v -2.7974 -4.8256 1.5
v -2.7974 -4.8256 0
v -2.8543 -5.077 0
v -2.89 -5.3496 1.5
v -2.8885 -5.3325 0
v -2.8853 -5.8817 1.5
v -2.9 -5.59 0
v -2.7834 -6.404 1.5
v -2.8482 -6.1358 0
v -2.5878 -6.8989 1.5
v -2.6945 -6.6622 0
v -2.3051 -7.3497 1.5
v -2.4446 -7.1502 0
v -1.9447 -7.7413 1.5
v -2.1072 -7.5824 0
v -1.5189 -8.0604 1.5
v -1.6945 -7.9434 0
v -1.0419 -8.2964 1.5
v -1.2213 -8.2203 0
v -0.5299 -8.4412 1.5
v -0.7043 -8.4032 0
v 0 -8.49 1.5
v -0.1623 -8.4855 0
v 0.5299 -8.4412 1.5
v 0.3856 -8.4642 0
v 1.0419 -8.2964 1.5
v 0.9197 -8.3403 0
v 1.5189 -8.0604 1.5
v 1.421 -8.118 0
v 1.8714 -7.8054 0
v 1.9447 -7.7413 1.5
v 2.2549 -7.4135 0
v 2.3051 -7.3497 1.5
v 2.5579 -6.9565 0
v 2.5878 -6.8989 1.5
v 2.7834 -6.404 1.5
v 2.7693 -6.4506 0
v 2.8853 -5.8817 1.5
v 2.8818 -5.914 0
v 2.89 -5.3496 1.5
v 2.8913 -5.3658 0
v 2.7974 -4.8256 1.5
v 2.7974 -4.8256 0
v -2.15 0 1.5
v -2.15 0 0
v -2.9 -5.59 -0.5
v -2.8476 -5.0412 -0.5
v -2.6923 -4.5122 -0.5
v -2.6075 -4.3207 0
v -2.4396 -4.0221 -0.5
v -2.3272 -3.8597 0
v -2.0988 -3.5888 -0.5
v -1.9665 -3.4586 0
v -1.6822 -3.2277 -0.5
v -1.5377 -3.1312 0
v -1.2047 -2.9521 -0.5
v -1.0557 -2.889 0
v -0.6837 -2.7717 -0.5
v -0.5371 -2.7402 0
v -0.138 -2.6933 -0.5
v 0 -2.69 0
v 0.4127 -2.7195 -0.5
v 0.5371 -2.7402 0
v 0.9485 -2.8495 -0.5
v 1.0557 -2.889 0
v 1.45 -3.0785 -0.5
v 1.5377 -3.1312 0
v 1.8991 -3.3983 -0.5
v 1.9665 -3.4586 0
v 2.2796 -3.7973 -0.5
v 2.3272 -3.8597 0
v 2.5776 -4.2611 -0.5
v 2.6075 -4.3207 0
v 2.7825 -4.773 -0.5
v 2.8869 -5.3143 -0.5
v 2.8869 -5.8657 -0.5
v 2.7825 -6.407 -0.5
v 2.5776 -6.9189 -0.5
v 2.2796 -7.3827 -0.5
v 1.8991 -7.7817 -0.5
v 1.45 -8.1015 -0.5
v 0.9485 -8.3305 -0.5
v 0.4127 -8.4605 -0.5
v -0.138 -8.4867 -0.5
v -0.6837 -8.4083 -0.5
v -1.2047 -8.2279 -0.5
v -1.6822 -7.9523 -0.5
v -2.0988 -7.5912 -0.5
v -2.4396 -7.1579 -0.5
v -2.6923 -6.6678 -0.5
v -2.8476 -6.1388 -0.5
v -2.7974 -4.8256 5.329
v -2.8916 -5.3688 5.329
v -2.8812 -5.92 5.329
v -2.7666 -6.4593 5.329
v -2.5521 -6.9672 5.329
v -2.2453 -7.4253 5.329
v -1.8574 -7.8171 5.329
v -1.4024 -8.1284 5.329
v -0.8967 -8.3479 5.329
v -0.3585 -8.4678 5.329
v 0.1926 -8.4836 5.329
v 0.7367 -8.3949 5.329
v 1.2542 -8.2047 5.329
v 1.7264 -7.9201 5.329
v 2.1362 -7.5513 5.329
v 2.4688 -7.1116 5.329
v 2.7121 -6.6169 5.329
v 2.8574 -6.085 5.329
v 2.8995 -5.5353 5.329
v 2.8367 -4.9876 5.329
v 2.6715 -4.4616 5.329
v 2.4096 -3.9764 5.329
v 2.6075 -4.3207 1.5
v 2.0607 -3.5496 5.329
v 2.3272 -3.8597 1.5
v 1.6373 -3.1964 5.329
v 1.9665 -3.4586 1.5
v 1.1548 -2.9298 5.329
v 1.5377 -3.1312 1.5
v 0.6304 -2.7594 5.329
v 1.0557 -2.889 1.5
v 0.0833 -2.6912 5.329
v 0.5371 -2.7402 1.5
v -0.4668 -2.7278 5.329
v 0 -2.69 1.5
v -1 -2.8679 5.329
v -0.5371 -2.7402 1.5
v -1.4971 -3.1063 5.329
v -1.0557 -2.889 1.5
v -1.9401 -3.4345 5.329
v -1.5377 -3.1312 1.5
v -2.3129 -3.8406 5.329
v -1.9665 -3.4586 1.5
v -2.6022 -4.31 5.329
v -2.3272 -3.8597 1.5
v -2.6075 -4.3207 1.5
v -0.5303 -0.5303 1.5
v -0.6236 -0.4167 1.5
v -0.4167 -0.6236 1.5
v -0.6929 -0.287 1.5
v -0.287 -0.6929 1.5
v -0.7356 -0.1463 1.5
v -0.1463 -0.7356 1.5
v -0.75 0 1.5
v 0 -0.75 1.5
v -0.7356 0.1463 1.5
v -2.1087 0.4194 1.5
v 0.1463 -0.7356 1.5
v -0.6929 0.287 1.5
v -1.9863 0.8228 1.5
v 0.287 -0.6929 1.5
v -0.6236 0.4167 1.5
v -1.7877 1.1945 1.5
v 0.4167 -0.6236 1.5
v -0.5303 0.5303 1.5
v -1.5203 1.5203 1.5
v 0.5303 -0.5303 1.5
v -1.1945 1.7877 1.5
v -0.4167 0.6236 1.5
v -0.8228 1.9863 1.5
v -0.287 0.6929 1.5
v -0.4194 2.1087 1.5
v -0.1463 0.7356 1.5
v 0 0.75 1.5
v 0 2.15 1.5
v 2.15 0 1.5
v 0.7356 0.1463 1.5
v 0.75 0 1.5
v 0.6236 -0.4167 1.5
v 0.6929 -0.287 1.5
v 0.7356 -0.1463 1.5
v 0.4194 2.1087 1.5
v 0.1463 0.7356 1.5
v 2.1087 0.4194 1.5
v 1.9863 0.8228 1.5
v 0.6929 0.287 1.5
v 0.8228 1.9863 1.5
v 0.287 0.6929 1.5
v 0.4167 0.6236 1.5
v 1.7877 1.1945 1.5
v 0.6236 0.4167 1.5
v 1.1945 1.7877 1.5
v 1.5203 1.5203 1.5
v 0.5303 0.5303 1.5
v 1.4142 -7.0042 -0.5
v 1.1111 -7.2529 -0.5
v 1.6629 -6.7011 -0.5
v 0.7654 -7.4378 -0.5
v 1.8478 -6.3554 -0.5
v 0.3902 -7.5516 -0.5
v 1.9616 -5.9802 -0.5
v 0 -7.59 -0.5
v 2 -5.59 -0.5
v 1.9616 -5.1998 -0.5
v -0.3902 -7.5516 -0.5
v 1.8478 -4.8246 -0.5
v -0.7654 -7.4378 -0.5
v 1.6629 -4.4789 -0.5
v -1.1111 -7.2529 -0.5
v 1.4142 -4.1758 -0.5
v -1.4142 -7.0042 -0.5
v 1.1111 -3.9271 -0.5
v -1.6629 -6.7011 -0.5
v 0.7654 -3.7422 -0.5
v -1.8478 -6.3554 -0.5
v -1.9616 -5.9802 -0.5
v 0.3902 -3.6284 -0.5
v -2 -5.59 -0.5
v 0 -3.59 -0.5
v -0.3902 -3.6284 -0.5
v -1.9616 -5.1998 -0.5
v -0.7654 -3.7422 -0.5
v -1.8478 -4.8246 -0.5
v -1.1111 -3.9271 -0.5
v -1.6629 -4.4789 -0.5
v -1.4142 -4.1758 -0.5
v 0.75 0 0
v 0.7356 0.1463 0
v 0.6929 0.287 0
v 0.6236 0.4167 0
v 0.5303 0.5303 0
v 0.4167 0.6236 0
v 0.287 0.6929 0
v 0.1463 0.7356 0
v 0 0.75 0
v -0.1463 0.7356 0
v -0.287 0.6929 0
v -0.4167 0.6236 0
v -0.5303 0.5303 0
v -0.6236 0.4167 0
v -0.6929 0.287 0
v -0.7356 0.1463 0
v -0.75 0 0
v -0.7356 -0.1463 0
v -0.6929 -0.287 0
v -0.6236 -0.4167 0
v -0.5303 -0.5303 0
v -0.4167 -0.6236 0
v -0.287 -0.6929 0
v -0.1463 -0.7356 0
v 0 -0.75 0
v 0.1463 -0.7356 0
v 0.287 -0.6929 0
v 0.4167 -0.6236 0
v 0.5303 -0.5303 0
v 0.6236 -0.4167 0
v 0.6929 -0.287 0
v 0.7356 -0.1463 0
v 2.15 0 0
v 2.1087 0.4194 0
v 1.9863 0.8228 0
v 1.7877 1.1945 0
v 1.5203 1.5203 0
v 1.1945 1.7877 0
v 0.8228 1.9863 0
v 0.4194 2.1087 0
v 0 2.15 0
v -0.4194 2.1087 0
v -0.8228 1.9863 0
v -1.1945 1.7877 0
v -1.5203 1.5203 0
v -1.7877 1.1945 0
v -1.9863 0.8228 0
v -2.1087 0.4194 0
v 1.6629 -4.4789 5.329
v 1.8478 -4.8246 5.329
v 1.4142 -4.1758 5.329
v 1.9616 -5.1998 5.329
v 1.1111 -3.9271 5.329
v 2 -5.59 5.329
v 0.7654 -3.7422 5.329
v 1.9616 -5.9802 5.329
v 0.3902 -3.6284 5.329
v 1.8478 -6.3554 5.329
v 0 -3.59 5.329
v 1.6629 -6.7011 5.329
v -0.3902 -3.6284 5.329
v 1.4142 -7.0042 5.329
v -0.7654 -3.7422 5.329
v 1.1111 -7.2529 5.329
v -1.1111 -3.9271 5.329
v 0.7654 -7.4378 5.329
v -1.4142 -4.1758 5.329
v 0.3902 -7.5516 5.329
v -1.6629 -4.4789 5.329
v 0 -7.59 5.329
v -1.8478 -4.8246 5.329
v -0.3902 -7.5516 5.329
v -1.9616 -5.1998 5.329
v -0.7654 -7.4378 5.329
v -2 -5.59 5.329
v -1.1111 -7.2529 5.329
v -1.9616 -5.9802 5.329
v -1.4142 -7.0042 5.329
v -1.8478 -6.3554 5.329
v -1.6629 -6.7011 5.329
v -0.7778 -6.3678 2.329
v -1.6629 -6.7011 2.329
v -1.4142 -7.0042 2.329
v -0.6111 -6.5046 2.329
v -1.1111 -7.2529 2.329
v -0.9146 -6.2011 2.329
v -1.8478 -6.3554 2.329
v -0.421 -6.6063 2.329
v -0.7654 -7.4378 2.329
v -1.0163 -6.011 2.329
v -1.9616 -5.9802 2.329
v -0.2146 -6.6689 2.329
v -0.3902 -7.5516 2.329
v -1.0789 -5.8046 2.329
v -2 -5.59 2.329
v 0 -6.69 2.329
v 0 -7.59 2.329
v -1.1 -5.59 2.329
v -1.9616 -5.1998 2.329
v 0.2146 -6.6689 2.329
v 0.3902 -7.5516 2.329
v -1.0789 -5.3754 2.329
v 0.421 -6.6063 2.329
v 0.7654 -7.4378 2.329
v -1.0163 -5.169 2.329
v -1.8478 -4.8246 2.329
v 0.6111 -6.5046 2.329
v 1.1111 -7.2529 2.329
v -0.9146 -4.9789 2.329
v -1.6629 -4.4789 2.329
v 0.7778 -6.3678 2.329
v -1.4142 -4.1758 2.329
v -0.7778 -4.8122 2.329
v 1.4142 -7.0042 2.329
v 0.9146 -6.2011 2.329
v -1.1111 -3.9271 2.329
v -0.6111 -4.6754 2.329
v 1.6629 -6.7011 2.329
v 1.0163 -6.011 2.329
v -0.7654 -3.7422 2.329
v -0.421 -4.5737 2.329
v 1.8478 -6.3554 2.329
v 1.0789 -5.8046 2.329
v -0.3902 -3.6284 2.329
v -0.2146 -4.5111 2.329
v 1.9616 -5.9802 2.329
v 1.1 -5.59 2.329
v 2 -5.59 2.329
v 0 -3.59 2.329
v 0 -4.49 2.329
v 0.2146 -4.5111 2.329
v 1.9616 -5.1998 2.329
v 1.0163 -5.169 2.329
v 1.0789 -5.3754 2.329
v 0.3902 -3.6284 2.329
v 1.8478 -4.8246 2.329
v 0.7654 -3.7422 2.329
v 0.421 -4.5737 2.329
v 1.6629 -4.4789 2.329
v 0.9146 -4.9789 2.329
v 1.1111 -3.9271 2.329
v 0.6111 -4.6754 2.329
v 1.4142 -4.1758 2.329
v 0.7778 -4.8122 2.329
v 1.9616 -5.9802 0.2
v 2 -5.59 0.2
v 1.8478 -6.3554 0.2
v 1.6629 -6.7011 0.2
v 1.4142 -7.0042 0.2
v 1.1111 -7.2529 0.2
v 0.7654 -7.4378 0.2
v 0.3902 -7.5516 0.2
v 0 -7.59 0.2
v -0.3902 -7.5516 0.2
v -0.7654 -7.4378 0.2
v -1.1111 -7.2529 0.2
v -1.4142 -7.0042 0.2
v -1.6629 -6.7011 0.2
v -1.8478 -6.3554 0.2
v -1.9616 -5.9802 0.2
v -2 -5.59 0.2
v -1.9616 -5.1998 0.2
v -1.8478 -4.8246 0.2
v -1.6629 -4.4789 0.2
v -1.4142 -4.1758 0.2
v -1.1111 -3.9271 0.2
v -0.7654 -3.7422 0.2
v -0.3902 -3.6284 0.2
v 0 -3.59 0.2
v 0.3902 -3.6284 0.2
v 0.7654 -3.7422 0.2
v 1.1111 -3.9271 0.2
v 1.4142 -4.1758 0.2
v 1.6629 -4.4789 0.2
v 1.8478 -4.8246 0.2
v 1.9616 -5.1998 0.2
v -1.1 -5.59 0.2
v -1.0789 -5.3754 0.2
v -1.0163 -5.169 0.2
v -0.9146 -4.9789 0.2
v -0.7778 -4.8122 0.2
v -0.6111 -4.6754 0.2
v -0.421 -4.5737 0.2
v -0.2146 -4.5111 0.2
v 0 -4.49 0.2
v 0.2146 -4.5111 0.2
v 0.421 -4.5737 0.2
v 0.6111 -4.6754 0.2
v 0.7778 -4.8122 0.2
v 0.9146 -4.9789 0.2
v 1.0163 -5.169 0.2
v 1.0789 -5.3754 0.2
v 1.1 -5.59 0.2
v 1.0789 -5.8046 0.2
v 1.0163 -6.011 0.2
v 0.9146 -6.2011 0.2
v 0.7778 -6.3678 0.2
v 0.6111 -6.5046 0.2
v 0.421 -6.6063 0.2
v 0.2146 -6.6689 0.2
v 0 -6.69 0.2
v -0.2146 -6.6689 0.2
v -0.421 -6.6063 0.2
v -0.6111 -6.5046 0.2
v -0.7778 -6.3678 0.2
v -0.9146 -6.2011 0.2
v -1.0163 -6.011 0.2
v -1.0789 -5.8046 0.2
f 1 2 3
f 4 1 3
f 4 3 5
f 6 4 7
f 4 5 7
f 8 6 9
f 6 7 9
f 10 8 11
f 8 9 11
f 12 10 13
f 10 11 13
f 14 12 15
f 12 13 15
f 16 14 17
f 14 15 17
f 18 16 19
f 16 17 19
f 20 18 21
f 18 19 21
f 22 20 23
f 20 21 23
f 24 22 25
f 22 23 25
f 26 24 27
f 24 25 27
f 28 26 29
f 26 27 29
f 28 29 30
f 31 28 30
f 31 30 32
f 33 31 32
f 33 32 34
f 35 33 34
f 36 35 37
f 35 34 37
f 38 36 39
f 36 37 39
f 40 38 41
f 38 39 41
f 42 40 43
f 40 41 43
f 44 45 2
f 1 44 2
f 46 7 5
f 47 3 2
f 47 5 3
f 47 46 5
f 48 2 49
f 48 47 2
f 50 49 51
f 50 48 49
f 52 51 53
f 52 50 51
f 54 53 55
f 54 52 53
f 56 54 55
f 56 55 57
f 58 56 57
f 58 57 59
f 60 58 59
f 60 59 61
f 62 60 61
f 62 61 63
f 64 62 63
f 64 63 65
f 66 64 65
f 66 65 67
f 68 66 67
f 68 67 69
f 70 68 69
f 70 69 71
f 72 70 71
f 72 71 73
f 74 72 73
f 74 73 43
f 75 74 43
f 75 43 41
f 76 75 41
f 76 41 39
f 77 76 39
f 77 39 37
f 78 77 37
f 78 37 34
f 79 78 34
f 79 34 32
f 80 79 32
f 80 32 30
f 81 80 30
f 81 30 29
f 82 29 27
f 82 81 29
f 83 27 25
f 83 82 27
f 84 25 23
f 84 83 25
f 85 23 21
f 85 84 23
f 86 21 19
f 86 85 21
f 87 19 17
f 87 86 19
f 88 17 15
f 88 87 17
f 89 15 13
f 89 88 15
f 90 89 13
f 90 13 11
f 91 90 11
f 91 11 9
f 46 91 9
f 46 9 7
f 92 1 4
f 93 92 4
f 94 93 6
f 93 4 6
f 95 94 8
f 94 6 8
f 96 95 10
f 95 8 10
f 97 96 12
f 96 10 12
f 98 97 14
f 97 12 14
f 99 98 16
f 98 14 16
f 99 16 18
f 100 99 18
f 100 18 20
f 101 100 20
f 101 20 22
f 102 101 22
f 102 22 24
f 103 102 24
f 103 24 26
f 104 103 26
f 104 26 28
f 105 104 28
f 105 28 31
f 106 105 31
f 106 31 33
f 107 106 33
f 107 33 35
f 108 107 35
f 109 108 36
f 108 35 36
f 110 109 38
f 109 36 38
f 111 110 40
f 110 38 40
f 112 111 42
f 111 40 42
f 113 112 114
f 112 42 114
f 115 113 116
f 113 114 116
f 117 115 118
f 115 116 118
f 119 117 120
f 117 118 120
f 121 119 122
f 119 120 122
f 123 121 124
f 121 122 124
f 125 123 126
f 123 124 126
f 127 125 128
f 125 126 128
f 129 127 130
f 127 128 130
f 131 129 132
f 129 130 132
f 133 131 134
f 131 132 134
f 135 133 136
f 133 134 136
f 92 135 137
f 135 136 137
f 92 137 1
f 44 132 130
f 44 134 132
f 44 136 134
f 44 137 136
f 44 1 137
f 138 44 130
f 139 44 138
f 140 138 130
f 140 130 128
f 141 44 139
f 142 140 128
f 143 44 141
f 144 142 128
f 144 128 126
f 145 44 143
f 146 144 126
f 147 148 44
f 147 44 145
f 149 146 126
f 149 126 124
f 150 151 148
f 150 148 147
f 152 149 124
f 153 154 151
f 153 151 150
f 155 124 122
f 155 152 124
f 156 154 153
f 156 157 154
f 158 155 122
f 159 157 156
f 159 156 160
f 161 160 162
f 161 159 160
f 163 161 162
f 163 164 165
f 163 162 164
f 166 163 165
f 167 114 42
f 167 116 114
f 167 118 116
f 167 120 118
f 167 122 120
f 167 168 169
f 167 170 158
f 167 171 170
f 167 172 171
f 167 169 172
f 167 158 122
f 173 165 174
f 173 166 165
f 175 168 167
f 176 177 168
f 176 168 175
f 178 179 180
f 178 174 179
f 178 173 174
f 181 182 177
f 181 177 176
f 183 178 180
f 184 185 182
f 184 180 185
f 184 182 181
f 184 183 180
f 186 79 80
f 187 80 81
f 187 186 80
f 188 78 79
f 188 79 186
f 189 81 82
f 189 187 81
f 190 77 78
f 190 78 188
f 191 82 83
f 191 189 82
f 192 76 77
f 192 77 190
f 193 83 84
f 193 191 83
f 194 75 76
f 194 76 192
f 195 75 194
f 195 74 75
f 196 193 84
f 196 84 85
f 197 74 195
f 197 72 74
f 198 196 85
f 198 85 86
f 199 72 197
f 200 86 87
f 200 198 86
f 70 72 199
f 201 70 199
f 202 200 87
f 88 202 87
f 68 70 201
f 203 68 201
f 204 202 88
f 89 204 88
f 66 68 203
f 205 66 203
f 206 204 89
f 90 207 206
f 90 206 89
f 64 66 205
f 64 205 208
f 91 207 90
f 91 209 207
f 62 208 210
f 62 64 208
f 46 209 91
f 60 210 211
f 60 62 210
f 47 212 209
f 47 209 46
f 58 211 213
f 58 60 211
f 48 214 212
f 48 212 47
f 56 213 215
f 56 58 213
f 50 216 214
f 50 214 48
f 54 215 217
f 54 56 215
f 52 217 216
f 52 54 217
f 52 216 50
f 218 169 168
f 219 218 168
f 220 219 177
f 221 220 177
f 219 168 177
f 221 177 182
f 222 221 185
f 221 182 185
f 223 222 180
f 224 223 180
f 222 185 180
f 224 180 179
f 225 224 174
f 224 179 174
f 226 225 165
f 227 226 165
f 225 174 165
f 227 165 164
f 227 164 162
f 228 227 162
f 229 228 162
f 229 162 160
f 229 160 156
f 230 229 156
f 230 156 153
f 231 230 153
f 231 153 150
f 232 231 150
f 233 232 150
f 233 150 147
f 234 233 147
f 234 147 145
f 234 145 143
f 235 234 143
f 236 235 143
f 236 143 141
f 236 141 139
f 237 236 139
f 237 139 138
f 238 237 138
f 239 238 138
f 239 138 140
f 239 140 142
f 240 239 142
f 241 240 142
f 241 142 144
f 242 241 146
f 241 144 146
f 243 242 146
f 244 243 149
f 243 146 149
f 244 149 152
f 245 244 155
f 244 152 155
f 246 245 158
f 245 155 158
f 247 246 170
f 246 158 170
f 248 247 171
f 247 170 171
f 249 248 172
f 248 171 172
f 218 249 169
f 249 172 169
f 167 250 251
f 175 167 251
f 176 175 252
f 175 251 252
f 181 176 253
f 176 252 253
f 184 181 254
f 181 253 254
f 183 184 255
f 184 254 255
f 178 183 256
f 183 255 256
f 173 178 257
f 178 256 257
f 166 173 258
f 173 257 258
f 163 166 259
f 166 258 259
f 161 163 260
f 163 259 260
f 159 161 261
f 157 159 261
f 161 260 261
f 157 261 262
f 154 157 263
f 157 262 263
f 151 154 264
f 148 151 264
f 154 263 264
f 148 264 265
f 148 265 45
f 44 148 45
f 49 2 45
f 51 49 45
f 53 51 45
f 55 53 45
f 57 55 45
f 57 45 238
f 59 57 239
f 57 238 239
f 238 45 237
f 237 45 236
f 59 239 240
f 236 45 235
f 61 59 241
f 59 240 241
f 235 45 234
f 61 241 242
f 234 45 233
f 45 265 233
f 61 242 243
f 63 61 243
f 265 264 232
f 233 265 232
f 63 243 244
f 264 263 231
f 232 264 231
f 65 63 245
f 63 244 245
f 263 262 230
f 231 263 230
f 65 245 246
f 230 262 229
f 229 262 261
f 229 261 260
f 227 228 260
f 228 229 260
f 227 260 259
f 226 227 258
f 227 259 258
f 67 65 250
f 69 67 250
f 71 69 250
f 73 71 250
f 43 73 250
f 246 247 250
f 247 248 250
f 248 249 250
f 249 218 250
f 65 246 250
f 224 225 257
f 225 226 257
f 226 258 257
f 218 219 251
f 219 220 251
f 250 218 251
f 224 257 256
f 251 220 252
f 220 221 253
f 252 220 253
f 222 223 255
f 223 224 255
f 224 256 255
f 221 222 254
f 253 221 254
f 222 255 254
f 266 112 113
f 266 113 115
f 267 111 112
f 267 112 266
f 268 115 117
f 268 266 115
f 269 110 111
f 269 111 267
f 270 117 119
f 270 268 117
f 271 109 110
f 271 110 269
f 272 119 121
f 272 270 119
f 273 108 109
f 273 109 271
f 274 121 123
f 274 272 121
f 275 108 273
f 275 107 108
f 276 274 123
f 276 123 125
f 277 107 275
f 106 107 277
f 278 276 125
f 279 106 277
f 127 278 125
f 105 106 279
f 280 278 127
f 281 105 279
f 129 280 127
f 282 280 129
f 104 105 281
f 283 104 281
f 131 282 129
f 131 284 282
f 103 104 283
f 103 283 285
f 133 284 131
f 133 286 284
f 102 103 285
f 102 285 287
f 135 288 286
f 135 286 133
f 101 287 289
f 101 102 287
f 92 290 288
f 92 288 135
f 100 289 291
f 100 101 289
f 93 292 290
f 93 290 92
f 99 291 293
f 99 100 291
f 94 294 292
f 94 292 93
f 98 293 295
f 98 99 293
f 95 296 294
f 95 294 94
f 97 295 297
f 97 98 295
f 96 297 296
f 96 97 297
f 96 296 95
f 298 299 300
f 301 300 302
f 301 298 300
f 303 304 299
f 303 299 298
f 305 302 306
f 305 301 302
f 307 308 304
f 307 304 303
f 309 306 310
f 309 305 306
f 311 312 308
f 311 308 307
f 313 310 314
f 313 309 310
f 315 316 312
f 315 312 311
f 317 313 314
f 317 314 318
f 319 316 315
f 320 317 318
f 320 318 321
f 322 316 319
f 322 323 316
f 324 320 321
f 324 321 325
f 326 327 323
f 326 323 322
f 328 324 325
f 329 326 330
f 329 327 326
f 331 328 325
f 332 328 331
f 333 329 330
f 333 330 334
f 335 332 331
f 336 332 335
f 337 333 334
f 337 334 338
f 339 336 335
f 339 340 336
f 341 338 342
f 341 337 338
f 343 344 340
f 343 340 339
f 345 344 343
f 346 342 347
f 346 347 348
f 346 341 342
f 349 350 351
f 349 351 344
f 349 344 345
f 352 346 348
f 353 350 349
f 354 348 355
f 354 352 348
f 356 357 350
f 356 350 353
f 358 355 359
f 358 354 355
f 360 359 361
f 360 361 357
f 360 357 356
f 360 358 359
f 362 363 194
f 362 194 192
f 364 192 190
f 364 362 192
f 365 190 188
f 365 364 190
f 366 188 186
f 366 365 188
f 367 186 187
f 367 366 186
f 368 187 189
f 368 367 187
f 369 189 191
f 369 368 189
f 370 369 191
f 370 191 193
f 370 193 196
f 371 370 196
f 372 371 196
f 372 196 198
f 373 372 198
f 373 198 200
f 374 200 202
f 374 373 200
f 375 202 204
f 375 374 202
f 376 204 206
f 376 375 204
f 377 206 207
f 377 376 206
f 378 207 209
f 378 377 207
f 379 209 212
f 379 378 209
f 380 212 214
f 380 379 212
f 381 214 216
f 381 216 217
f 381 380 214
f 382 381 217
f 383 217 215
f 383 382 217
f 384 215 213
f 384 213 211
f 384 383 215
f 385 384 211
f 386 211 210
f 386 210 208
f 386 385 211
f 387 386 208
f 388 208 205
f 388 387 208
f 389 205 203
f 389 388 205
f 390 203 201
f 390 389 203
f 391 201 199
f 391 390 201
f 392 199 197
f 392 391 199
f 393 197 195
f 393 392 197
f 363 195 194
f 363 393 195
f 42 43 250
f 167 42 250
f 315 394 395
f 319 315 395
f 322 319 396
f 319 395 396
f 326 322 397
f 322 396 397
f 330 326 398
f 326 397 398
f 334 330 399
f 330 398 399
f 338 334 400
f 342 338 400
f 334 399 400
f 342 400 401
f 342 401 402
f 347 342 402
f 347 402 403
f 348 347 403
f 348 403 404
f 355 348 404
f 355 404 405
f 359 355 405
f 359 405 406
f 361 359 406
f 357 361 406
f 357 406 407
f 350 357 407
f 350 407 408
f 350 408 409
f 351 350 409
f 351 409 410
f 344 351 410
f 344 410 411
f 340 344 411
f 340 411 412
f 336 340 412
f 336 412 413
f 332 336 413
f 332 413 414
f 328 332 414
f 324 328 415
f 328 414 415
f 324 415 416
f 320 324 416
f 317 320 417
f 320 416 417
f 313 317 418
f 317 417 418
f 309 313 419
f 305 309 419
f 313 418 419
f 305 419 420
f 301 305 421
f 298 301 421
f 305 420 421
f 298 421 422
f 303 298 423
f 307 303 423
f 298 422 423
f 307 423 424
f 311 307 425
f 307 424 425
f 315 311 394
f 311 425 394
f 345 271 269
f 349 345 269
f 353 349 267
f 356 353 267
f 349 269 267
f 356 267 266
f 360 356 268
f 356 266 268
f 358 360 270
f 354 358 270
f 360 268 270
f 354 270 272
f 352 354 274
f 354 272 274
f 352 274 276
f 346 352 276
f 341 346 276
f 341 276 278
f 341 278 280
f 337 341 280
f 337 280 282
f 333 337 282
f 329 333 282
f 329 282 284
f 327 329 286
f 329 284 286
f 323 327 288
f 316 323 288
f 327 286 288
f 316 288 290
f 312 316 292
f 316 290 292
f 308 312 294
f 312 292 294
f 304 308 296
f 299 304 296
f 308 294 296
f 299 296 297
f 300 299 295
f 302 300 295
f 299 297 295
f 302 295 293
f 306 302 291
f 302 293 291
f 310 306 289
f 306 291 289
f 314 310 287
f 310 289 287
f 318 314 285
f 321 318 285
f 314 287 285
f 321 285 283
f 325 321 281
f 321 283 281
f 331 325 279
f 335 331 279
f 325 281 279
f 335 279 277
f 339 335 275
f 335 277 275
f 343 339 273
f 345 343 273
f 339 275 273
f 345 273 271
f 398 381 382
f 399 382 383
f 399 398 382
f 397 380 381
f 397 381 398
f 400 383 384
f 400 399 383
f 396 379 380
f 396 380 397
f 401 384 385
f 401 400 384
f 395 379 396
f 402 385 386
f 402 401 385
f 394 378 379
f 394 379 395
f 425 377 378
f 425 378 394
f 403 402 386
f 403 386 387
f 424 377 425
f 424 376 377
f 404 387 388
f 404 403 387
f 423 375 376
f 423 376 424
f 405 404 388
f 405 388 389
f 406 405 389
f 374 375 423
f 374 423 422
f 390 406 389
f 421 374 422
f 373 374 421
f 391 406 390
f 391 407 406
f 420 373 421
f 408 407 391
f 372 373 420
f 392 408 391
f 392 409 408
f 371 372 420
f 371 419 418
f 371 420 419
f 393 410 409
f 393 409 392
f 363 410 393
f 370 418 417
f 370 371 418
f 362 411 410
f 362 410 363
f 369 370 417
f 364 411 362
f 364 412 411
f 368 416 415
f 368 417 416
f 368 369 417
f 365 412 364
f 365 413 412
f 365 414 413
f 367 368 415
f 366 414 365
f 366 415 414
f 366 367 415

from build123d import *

# Parameters (mm, degrees)
EXTRUDE_1_DEPTH     = 1.5
SKETCH_3_R          = 2.9
EXTRUDE_2_DEPTH     = 3.829
EXTRUDE_START       = 0.5
SKETCH_4_R          = 2.9
EXTRUDE_3_DEPTH     = 0.5
SKETCH_5_R          = 2
CUT_EXTRUDE_1_DEPTH = 3
CUT_EXTRUDE_START   = -0.7
SKETCH_6_R          = 2
CUT_EXTRUDE_2_DEPTH = 0.7
SKETCH_7_R          = 1.1
CUT_EXTRUDE_3_DEPTH = 3.7
SKETCH_8_R          = 0.75
CUT_EXTRUDE_4_DEPTH = 3.7


with BuildPart() as part:
    # 草图1 → 凸台-拉伸1 (new body)
    with BuildSketch(Plane.XY):
        with BuildLine():
            Line((-2.15, 0), (-2.797439847, -4.825584994))
            ThreePointArc((-2.797439847, -4.825584994), (0, -8.49), (2.797439847, -4.825584994))
            Line((2.797439847, -4.825584994), (2.15, 0))
            ThreePointArc((2.15, 0), (0, 2.15), (-2.15, 0))
        make_face()
    extrude(amount=EXTRUDE_1_DEPTH)

    # 草图3 → 凸台-拉伸2 (add)
    with BuildSketch(Plane.XY.offset(1.5)):
        with Locations(Location((0, -5.59, 0), (0, 0, 164.716730752))):
            Circle(SKETCH_3_R)
    extrude(amount=EXTRUDE_2_DEPTH)

    # 草图4 → 凸台-拉伸3 (add)
    with BuildSketch(Plane(origin=(0, 0, 0), x_dir=(-1, 0, 0), z_dir=(0, 0, -1)).offset(EXTRUDE_START)):
        with Locations((0, -5.59)):
            Circle(SKETCH_4_R)
    extrude(amount=-EXTRUDE_3_DEPTH)

    # 草图5 → 切除-拉伸1 (cut)
    with BuildSketch(Plane.XY.offset(5.329)):
        with Locations((0, -5.59)):
            Circle(SKETCH_5_R)
    extrude(amount=-CUT_EXTRUDE_1_DEPTH, mode=Mode.SUBTRACT)

    # 草图6 → 切除-拉伸2 (cut)
    with BuildSketch(Plane(origin=(0, 0, -0.5), x_dir=(-1, 0, 0), z_dir=(0, 0, -1)).offset(CUT_EXTRUDE_START)):
        with Locations(Location((0, -5.59, 0), (0, 0, 180))):
            Circle(SKETCH_6_R)
    extrude(amount=CUT_EXTRUDE_2_DEPTH, mode=Mode.SUBTRACT)

    # 草图7 → 切除-拉伸3 (cut)
    with BuildSketch(Plane(origin=(0, 0, 0.2), x_dir=(-1, 0, 0), z_dir=(0, 0, -1))):
        with Locations((0, -5.59)):
            Circle(SKETCH_7_R)
    extrude(amount=-CUT_EXTRUDE_3_DEPTH, mode=Mode.SUBTRACT)

    # 草图8 → 切除-拉伸4 (cut)
    with BuildSketch(Plane.XY.offset(1.5)):
        Circle(SKETCH_8_R)
    extrude(amount=-CUT_EXTRUDE_4_DEPTH, mode=Mode.SUBTRACT)


solid = part.part
